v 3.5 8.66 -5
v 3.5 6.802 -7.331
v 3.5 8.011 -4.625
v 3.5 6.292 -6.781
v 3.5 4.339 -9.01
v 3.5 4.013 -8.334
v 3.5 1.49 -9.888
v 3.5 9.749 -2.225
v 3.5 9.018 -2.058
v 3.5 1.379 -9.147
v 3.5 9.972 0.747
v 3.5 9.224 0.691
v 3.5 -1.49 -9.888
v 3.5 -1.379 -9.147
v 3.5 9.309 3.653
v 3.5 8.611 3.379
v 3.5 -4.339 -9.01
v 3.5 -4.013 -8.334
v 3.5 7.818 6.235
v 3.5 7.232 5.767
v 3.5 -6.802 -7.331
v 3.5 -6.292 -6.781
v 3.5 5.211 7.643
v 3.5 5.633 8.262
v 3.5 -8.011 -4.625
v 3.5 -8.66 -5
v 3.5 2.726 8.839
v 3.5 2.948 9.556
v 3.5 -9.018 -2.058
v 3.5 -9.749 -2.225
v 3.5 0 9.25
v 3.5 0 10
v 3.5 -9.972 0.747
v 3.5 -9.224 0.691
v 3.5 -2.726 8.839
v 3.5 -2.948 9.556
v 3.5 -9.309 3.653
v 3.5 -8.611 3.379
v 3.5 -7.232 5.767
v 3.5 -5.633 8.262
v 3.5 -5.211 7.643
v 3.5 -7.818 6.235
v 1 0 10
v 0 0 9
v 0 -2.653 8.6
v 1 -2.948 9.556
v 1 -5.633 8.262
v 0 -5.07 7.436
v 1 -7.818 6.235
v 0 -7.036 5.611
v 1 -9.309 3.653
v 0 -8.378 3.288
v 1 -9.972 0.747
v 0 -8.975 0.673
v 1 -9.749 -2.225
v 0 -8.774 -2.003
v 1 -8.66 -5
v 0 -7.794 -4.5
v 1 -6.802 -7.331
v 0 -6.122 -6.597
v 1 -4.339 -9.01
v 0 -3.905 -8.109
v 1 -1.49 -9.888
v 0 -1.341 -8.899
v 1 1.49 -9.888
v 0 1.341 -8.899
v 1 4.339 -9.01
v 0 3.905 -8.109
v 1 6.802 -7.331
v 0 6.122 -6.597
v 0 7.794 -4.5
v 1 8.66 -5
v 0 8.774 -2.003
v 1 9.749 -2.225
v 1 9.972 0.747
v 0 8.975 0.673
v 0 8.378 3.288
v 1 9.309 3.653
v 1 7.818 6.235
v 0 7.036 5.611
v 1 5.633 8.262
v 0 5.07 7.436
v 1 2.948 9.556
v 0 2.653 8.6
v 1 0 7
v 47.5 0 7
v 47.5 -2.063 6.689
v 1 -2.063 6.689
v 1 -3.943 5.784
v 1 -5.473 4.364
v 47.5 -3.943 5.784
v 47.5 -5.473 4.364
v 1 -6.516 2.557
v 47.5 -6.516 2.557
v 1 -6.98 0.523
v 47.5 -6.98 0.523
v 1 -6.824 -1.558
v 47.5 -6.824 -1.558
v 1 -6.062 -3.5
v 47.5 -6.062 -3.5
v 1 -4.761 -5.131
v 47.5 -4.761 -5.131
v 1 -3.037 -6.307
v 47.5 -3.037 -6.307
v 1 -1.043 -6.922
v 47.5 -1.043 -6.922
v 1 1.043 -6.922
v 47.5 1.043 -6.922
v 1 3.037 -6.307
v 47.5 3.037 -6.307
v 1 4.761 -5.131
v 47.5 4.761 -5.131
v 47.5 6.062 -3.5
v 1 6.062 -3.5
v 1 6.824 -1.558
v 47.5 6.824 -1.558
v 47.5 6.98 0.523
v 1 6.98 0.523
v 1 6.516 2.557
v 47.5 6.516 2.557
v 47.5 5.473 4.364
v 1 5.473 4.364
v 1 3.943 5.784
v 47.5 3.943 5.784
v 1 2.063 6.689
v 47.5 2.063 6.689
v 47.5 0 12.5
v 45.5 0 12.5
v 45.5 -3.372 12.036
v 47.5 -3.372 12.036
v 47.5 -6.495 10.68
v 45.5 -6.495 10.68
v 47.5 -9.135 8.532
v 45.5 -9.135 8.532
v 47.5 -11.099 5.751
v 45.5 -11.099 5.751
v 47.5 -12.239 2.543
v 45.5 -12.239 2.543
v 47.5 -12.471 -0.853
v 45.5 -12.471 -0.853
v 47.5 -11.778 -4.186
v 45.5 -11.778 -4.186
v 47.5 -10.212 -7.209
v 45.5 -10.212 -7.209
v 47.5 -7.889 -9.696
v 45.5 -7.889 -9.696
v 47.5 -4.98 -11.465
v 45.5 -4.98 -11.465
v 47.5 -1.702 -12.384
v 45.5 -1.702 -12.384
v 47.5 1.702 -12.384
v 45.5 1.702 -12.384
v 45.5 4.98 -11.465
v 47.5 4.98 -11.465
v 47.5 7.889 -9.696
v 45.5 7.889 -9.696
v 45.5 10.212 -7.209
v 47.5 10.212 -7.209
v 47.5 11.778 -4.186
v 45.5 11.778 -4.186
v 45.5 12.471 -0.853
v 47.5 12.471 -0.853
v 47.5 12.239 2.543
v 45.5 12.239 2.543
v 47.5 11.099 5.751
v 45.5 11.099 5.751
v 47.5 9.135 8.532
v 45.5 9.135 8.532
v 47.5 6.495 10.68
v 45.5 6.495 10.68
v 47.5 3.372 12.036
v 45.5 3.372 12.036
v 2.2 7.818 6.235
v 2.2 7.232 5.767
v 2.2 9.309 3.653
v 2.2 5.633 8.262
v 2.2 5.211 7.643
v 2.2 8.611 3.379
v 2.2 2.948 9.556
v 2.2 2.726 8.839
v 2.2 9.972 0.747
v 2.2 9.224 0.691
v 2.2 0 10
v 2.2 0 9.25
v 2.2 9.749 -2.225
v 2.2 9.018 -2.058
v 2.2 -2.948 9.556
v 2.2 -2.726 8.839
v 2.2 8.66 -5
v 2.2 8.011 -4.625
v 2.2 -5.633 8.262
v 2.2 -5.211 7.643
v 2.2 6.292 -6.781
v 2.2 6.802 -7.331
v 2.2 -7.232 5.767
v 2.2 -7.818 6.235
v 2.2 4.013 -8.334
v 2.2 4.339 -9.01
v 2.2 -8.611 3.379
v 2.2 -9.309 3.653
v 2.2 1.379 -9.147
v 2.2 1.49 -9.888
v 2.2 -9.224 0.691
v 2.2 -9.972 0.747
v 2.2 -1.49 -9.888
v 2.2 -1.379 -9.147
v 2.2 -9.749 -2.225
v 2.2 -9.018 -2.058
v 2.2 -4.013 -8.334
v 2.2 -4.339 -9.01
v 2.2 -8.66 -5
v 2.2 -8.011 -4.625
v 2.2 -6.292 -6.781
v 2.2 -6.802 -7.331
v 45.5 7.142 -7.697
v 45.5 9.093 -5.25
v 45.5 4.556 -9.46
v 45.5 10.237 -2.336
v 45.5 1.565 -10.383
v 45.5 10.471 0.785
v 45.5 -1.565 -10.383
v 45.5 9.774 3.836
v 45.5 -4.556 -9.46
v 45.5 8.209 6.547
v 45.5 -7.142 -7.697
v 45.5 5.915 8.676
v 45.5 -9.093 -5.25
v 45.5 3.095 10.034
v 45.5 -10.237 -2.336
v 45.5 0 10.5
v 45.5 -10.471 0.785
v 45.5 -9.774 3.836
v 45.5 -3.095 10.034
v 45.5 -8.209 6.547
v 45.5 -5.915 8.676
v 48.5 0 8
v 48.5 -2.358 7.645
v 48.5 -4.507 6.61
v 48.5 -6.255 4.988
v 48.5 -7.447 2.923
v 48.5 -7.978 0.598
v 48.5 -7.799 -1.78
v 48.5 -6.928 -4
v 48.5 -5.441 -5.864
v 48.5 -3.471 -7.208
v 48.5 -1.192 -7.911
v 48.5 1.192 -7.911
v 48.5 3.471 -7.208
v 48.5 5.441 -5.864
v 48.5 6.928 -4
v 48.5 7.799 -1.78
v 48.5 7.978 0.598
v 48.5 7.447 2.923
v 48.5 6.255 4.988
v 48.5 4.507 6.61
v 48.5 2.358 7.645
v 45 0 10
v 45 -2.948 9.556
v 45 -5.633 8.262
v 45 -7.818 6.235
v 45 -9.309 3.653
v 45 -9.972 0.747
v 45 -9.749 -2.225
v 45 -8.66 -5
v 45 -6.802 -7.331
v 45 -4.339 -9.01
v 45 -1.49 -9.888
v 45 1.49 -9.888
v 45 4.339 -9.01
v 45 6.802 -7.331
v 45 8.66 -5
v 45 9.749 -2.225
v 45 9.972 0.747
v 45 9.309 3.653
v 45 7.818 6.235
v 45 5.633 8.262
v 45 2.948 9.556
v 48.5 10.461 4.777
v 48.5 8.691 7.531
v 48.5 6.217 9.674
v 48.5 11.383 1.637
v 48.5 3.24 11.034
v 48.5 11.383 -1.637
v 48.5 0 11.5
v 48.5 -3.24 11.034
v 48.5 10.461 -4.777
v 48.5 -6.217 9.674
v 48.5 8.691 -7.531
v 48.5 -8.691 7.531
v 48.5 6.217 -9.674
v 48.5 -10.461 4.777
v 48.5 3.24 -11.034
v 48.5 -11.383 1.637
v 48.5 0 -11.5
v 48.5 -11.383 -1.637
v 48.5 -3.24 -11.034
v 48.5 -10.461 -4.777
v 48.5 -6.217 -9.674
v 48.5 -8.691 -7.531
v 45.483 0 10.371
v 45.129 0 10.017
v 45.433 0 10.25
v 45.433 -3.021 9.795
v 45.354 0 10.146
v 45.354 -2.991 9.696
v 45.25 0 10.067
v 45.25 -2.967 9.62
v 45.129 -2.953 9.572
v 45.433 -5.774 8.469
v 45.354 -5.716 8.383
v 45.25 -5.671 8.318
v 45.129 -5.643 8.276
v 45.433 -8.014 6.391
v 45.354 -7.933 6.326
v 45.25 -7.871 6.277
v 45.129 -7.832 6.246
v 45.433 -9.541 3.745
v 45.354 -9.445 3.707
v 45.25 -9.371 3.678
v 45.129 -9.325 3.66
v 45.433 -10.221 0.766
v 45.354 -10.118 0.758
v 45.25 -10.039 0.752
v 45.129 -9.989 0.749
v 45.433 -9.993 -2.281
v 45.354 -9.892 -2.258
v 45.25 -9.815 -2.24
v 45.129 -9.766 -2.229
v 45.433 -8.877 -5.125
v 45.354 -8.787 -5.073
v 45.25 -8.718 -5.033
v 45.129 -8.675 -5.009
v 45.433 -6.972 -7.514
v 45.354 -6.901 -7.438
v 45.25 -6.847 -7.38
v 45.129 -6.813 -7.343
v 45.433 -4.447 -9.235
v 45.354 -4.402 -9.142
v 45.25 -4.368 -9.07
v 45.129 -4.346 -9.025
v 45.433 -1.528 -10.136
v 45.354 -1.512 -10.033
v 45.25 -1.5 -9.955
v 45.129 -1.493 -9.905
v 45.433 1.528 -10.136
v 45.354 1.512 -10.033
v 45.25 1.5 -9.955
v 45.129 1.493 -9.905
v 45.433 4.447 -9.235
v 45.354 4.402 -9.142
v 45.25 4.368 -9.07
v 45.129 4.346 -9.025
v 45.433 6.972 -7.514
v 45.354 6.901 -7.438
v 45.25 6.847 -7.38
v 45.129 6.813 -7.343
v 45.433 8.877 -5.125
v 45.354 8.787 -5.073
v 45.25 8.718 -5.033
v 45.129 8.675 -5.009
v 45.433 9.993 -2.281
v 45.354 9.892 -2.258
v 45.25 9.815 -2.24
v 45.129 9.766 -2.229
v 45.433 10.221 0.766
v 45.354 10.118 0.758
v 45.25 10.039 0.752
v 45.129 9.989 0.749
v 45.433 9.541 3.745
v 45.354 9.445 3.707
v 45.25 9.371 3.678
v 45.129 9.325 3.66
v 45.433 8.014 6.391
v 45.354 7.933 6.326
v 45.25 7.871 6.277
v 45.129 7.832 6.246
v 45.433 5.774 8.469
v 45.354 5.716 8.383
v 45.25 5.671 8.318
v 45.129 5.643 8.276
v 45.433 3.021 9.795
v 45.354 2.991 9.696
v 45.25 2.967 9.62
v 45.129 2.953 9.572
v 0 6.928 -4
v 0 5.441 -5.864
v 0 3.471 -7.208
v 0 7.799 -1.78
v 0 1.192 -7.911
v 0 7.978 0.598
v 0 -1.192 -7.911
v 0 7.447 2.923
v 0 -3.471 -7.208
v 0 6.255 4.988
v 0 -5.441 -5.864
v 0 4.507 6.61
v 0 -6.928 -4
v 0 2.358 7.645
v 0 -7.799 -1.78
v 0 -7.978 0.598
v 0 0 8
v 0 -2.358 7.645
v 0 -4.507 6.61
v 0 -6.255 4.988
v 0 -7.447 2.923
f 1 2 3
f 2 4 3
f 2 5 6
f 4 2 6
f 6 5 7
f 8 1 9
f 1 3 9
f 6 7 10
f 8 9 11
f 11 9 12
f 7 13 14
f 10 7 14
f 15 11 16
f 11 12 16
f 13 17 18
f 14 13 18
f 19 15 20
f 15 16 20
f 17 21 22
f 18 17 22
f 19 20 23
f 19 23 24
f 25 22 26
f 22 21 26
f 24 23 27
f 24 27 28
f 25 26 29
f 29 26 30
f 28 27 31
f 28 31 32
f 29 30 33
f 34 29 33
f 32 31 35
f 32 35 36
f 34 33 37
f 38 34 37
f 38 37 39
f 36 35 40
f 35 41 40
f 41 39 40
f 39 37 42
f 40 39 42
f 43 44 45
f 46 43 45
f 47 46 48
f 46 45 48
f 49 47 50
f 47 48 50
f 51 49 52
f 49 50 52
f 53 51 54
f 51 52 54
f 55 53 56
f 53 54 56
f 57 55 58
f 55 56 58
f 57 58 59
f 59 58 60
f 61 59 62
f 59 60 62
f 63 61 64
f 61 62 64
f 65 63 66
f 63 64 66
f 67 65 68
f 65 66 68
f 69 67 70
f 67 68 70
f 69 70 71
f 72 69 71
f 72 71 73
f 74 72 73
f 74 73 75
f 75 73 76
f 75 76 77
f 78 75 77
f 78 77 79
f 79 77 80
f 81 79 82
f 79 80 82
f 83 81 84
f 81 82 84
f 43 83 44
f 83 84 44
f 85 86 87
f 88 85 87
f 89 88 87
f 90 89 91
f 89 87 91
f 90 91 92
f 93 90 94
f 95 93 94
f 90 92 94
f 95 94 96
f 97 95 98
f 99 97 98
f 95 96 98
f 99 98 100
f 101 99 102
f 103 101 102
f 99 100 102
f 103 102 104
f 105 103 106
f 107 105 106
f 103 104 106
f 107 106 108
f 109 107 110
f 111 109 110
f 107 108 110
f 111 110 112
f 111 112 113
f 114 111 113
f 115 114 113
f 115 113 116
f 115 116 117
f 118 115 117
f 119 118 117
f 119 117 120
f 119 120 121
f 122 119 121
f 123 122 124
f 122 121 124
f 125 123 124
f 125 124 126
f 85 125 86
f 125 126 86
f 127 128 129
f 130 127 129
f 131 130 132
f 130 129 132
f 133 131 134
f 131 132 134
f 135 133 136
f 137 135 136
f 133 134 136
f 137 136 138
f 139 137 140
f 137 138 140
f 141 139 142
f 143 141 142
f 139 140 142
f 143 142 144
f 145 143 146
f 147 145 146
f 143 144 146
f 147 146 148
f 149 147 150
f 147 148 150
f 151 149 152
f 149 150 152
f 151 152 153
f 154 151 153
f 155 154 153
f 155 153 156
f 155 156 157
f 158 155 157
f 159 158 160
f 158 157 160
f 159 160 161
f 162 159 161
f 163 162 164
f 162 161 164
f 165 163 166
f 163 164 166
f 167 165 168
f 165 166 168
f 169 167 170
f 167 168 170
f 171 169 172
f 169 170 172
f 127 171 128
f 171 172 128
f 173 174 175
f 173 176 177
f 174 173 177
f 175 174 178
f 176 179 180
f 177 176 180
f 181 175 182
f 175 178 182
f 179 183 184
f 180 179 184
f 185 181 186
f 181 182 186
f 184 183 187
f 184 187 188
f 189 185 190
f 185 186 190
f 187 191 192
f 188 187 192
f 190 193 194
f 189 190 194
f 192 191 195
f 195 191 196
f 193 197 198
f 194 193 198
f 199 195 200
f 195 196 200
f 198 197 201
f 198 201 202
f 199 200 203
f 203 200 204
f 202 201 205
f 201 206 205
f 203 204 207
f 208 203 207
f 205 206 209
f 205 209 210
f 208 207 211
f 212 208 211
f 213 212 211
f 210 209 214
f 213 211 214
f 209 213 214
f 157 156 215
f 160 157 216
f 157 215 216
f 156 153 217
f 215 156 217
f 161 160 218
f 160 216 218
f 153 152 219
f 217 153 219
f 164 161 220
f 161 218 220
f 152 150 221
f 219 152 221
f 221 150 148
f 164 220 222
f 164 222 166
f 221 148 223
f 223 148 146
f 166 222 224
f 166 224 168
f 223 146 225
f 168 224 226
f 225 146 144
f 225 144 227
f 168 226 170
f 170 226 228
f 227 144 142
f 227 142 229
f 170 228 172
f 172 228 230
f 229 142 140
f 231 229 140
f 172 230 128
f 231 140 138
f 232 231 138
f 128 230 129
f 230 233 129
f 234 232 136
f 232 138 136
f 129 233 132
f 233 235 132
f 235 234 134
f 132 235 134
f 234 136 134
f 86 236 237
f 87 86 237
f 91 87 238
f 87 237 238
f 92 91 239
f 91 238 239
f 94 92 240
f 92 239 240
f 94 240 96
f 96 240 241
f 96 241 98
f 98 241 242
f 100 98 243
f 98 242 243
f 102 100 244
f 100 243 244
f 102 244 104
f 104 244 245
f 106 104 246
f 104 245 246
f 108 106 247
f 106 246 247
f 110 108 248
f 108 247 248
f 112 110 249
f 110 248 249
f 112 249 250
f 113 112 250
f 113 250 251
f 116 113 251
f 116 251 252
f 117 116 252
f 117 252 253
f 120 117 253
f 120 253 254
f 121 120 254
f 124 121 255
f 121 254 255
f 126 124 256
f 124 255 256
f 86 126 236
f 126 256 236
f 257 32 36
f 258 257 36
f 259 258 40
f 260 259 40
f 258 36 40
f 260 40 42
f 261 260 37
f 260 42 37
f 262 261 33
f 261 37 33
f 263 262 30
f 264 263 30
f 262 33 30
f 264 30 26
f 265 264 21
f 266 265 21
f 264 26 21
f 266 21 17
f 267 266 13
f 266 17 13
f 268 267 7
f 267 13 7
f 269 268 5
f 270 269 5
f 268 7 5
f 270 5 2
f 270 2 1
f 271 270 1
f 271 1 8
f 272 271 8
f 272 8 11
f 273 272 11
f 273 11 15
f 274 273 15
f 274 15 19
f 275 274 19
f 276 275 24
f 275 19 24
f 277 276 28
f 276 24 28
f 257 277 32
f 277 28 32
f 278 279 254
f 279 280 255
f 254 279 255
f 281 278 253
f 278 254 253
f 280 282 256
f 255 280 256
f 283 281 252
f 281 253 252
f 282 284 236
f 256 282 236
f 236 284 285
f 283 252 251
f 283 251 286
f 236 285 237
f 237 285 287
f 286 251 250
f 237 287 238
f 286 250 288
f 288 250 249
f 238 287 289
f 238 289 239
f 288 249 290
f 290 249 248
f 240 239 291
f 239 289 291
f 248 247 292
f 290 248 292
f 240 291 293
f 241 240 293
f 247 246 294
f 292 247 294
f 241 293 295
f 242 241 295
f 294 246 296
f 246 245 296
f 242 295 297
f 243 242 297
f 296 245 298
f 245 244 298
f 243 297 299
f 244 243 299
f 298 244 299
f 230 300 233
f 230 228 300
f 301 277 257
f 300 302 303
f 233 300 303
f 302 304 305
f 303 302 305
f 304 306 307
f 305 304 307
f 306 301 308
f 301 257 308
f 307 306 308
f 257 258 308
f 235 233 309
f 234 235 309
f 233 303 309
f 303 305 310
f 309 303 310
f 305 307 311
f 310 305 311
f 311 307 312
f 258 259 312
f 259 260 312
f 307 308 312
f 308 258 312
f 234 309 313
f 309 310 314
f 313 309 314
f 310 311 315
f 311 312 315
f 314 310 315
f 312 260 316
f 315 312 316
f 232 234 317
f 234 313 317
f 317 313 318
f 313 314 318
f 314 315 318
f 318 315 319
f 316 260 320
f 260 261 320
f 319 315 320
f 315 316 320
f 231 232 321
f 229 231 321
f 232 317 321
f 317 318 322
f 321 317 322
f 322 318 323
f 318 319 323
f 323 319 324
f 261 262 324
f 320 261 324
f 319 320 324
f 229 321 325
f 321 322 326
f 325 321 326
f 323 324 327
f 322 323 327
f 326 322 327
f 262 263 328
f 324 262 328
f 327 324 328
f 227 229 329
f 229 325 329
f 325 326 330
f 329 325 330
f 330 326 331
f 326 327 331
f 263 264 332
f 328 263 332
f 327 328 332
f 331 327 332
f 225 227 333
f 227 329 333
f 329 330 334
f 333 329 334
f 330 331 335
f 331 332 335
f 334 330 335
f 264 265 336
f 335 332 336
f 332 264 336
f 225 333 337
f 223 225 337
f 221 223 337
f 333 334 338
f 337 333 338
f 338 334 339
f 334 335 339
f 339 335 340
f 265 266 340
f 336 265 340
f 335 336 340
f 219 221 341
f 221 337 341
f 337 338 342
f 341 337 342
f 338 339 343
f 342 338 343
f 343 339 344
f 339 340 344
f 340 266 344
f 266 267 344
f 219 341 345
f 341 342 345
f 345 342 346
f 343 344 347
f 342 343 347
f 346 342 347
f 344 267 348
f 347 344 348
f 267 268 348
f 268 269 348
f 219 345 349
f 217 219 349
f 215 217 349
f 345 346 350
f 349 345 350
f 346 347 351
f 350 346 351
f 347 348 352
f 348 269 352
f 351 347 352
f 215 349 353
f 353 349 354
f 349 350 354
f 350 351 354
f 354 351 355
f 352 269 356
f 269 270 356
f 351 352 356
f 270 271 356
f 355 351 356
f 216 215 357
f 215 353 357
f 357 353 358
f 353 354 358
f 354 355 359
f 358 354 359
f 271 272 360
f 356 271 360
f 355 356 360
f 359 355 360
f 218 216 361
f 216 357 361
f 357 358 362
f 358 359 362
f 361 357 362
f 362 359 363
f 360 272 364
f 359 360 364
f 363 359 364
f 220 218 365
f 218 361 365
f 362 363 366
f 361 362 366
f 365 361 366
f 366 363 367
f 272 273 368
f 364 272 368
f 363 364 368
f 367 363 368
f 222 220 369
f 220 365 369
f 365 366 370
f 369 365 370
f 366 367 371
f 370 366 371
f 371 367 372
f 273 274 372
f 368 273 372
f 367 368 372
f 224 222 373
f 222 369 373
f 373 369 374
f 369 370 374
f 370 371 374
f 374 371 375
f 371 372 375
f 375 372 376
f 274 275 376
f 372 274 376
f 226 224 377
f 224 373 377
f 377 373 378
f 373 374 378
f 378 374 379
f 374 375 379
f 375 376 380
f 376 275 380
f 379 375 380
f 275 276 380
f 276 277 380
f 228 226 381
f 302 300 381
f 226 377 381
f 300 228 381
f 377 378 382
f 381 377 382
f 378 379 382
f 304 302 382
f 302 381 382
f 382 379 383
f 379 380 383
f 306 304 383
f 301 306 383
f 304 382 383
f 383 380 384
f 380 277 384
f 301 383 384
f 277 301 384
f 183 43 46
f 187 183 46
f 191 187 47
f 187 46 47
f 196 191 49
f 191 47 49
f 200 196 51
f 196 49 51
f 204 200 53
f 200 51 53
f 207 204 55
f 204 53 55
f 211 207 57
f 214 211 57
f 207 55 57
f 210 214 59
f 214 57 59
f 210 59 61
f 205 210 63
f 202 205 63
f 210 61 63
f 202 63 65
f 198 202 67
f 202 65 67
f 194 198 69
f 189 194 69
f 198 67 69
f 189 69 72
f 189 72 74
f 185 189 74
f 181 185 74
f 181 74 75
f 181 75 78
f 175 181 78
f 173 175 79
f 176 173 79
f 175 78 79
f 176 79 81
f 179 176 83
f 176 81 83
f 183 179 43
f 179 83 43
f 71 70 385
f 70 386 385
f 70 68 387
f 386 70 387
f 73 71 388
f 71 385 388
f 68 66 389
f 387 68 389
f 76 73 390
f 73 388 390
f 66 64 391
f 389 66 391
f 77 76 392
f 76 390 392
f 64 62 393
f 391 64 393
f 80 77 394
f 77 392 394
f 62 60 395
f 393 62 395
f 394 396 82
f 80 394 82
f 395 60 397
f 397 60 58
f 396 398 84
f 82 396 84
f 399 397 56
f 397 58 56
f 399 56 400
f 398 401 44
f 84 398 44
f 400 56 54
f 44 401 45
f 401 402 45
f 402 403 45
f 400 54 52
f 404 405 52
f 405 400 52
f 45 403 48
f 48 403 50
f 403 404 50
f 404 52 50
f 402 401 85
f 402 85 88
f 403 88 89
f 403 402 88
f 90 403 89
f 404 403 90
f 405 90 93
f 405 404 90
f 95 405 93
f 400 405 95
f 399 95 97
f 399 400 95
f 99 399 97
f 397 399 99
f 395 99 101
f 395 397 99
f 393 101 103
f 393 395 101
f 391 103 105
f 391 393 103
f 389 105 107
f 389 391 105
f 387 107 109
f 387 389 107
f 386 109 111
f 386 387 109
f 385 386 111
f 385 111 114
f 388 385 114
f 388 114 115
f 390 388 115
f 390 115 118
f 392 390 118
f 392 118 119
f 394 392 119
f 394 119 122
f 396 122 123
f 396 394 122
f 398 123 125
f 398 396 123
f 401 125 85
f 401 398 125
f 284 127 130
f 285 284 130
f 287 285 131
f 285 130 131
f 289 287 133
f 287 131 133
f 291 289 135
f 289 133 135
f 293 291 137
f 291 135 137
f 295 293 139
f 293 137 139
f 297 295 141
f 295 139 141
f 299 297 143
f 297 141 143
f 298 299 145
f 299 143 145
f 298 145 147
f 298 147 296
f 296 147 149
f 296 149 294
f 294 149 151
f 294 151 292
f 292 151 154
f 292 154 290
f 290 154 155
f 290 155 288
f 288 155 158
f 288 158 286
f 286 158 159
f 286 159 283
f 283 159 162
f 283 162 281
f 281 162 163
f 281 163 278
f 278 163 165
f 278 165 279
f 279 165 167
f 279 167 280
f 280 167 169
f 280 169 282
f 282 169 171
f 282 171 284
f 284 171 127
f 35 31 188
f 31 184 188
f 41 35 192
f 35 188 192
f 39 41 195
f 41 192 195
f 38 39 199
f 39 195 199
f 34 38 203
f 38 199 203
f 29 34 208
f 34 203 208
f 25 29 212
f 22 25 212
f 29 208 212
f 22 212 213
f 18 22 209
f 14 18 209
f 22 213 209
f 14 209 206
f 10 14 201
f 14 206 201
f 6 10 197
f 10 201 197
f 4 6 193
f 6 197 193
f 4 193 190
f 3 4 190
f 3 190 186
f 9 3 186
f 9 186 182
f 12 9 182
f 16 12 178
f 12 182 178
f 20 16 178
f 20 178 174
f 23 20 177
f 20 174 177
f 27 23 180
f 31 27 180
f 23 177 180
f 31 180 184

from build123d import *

# Parameters (mm, degrees)
CHAMFER1_SIZE = 1
FILLET1_R     = 0.5


with BuildPart() as part:
    # Sketch1 → Revolve1 (revolve)
    with BuildSketch(Plane.XY, mode=Mode.PRIVATE) as revolve1_sk:
        Polygon((0, -7), (48.5, -7), (48.5, -12.5), (45.5, -12.5), (45.5, -10), (3.5, -10), (3.5, -9.25), (2.2, -9.25), (2.2, -10), (0, -10), align=None)
    revolve(revolve1_sk.sketch.rotate(Axis((0, 0, 0), (1, 0, 0)), 270), axis=Axis((0, 0, 0), (1, 0, 0)))

    # Chamfer1
    chamfer1_edges = [part.edges().sort_by_distance(p)[0] for p in [
        (48.5, 0, -12.5),
        (48.5, 0, -7),
        (0, 0, -7),
        (0, 0, -10),
    ]]
    chamfer(chamfer1_edges, length=CHAMFER1_SIZE)

    # Fillet1
    fillet1_edges = [part.edges().sort_by_distance(p)[0] for p in [
        (45.5, 0, -10),
    ]]
    fillet(fillet1_edges, radius=FILLET1_R)


solid = part.part
